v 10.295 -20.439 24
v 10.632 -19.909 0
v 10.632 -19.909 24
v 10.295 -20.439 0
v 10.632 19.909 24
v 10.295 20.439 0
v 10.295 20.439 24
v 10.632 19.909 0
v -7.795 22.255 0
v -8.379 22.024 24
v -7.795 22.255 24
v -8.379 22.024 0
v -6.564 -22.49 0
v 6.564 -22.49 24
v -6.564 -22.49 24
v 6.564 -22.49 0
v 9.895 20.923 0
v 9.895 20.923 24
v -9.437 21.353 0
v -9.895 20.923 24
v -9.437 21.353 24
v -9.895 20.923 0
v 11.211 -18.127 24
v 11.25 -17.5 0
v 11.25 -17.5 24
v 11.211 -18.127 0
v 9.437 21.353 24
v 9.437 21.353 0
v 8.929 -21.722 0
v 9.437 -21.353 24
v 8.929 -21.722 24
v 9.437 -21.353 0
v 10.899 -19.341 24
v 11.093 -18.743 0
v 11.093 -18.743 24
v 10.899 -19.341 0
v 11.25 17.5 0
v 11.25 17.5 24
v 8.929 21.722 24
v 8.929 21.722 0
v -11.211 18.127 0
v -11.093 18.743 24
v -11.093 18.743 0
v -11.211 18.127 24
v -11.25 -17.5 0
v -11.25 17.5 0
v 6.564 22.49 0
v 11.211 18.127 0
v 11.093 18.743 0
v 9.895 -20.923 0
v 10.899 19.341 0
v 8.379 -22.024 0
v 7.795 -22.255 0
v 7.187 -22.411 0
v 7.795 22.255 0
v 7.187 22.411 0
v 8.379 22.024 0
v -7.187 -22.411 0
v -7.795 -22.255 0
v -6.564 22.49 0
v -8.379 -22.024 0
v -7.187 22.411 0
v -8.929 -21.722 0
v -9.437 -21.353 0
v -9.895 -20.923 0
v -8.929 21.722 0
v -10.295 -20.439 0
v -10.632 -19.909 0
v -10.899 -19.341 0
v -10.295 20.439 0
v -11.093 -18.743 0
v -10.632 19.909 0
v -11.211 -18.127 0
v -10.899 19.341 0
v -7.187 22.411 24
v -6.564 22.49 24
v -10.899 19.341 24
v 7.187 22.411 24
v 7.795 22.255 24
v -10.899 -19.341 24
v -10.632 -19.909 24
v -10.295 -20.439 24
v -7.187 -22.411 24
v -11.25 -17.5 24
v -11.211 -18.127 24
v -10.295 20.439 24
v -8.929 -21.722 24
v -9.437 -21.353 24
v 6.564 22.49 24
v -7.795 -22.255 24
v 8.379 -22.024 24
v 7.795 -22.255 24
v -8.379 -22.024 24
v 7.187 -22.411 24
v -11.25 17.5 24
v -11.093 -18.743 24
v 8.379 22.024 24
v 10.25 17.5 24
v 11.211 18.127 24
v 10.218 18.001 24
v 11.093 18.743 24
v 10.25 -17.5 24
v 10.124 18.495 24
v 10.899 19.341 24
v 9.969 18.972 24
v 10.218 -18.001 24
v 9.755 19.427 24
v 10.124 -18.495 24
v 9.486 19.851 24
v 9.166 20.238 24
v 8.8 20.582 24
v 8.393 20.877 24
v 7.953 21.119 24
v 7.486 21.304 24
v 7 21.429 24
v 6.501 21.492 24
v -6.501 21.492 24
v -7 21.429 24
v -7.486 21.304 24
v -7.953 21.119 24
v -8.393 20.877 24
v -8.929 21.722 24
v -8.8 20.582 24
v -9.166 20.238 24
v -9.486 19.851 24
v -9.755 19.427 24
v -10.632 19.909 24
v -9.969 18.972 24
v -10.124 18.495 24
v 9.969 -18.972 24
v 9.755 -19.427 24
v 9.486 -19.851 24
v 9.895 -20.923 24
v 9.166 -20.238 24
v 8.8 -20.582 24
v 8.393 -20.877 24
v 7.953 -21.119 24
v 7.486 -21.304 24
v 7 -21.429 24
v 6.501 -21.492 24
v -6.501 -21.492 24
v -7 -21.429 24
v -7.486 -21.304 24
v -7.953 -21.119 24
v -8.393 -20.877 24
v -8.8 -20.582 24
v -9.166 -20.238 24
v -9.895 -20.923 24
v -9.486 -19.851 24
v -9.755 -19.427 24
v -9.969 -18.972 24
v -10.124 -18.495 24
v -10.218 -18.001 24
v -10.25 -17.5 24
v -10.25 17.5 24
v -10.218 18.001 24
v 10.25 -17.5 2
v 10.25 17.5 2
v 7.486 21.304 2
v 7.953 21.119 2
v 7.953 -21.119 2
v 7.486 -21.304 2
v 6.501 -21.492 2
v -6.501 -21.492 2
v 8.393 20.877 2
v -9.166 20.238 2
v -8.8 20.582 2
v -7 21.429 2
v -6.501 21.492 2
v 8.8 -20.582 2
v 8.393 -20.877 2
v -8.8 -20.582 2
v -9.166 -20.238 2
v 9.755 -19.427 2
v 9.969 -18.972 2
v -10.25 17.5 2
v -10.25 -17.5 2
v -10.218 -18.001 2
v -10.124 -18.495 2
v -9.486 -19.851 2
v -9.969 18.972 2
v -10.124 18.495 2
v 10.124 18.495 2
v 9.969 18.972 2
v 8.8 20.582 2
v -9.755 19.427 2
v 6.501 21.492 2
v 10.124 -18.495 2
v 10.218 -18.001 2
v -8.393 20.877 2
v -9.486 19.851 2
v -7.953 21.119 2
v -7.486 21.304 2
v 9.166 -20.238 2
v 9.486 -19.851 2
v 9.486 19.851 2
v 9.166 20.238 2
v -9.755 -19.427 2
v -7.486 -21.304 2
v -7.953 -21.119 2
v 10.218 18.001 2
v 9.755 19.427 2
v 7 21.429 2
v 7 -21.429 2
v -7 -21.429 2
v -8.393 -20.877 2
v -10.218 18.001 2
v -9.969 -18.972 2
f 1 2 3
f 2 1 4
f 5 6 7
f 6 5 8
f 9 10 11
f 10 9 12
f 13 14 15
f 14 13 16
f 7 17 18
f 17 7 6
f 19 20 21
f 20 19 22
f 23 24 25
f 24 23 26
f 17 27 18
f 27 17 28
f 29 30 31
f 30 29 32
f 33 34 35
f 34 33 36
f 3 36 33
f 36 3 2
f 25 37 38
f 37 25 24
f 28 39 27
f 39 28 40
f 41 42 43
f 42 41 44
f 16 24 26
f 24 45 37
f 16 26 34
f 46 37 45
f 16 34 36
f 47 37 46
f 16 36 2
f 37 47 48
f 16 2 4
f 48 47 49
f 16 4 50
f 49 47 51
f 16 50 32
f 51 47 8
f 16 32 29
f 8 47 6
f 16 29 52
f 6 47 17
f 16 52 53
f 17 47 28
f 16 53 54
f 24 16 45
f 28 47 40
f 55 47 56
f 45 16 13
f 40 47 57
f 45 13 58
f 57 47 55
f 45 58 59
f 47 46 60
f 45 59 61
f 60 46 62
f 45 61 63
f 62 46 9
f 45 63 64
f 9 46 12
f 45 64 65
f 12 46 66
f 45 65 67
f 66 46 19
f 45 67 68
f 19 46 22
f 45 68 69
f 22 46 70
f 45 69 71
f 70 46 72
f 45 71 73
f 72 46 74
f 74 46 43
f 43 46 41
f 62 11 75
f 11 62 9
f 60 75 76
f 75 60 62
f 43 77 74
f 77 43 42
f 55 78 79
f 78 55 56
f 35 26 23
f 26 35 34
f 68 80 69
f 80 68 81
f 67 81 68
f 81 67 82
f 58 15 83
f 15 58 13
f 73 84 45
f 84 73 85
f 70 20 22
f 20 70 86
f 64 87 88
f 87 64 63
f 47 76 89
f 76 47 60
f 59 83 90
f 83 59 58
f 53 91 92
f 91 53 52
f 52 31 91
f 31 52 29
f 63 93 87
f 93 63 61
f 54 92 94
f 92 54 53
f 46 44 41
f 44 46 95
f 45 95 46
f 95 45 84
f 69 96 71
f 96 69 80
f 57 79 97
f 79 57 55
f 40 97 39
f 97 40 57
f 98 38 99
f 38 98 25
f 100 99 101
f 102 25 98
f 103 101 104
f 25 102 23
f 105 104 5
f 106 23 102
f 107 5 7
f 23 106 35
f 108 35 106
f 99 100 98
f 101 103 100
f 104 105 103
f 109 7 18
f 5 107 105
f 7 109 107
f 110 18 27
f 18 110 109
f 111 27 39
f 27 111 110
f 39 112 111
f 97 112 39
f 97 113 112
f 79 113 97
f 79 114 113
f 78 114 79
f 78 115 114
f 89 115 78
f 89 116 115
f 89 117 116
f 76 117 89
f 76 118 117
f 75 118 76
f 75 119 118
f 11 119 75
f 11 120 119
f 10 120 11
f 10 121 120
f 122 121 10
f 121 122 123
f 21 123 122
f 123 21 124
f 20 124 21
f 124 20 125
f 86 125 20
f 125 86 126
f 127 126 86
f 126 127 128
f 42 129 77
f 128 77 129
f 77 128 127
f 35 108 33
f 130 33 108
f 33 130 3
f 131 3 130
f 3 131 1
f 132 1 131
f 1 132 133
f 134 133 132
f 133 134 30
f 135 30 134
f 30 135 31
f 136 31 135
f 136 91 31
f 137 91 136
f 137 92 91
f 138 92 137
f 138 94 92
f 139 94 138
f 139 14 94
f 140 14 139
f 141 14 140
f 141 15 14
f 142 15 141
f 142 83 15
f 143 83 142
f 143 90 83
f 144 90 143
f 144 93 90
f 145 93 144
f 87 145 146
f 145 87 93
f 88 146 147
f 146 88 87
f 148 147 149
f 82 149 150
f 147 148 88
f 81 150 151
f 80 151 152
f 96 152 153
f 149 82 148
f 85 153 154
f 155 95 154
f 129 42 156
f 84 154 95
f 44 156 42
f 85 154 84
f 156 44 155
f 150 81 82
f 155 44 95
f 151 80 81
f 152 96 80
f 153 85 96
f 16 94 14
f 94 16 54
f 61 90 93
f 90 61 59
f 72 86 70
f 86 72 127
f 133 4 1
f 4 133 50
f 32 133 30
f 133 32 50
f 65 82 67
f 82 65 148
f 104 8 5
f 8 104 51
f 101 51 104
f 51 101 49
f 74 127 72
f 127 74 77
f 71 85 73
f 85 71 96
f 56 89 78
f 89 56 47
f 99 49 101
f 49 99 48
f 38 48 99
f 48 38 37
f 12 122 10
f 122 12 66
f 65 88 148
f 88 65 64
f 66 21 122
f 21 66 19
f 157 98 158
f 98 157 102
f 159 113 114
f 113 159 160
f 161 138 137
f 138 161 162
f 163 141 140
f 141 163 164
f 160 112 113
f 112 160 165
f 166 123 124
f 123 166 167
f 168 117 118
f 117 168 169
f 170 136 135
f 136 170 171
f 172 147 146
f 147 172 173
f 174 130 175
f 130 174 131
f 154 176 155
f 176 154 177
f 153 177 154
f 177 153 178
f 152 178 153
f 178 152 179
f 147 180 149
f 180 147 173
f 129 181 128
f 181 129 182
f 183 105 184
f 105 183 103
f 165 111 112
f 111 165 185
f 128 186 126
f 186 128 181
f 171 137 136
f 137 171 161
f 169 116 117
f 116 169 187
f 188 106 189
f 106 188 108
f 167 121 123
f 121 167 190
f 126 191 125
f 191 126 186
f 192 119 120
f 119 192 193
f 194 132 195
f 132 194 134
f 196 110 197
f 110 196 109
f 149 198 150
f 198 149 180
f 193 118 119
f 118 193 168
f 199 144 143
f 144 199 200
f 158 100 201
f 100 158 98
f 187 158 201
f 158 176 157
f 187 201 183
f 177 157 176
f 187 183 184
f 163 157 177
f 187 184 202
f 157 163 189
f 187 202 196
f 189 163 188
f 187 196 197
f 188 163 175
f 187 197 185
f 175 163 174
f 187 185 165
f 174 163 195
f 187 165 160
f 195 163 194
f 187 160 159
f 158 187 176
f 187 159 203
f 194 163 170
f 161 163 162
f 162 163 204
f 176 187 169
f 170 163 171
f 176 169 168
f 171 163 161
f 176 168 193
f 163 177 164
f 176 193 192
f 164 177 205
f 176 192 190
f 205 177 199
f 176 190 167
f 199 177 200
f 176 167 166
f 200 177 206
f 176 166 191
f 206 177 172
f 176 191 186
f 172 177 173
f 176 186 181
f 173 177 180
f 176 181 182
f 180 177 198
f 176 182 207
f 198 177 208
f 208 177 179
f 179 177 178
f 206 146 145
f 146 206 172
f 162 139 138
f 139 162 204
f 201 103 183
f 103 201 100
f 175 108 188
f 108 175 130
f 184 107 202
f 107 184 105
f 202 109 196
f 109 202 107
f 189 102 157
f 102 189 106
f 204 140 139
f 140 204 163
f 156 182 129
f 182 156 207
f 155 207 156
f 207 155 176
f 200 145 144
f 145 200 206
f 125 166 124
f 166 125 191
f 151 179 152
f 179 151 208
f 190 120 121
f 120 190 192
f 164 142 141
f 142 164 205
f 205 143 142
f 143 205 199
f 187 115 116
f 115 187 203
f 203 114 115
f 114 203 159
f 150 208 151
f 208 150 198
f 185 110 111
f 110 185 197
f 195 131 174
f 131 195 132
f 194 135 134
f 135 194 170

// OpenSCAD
$fn = 50;


difference() {
	union() {
		hull() {
			translate(v = [-6.2500000000, 17.5000000000, 0]) {
				cylinder(h = 24, r = 5);
			}
			translate(v = [6.2500000000, 17.5000000000, 0]) {
				cylinder(h = 24, r = 5);
			}
			translate(v = [-6.2500000000, -17.5000000000, 0]) {
				cylinder(h = 24, r = 5);
			}
			translate(v = [6.2500000000, -17.5000000000, 0]) {
				cylinder(h = 24, r = 5);
			}
		}
	}
	union() {
		translate(v = [0, 0, 2]) {
			hull() {
				translate(v = [-6.2500000000, 17.5000000000, 0]) {
					cylinder(h = 22, r = 4);
				}
				translate(v = [6.2500000000, 17.5000000000, 0]) {
					cylinder(h = 22, r = 4);
				}
				translate(v = [-6.2500000000, -17.5000000000, 0]) {
					cylinder(h = 22, r = 4);
				}
				translate(v = [6.2500000000, -17.5000000000, 0]) {
					cylinder(h = 22, r = 4);
				}
			}
		}
	}
}
